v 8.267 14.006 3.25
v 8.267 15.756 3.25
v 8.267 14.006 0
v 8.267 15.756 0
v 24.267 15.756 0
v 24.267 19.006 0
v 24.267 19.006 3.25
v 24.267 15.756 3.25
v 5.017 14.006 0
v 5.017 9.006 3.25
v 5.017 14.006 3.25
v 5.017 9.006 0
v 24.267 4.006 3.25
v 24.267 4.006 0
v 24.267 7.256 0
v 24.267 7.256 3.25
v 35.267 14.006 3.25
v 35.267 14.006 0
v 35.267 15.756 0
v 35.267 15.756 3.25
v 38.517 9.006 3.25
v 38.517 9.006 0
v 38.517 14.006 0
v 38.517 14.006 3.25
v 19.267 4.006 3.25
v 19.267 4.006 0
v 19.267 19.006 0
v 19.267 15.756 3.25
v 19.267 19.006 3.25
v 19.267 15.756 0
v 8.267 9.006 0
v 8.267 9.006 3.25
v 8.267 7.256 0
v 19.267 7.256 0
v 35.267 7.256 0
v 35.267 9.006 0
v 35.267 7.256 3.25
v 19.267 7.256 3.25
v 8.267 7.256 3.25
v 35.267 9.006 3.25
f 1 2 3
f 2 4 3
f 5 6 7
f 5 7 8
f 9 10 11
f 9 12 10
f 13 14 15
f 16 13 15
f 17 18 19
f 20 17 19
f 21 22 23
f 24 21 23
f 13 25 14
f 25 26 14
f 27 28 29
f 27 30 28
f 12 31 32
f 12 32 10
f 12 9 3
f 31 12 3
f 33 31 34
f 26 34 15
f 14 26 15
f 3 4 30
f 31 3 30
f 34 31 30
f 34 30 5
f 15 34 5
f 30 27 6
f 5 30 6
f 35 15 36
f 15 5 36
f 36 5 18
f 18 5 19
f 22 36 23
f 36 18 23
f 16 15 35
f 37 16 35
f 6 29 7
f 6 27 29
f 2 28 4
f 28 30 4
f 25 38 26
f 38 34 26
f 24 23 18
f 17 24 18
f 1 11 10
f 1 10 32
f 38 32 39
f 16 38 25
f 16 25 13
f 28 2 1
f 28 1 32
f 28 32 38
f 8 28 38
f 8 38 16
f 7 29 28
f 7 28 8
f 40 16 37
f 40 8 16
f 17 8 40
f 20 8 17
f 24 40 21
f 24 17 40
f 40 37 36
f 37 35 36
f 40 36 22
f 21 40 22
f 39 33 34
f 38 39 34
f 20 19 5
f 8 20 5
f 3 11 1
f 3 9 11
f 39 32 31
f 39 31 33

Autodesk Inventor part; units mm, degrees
ref_plane "YZ Plane" through (0, 0, 0) normal (1, 0, 0) x (0, 1, 0)
ref_plane "XZ Plane" through (0, 0, 0) normal (0, 1, 0) x (-1, 0, 0)
ref_plane "XY Plane" through (0, 0, 0) normal (0, 0, 1) x (1, 0, 0)
sketch "Block1" plane through (0, 0, 0) normal (0, 0, 1) x (1, 0, 0)
  circle A0 centre (74.029, 24.2723) radius 1
  line L0 (49.279, 30.4723) -> (71.779, 30.4723)
  line L1 (71.779, 30.4723) -> (71.779, 18.0723)
  line L2 (71.779, 18.0723) -> (49.279, 18.0723)
  line L3 (49.279, 18.0723) -> (49.279, 30.4723)
  line L4 (49.279, 30.4723) -> (44.779, 30.4723)
  line L5 (44.779, 30.4723) -> (44.779, 18.0723)
  line L6 (44.779, 18.0723) -> (49.279, 18.0723)
  line L7 (49.279, 18.0723) -> (49.279, 30.4723)
  line L8 (71.779, 30.4723) -> (76.279, 30.4723)
  line L9 (76.279, 30.4723) -> (76.279, 18.0723)
  line L10 (76.279, 18.0723) -> (71.779, 18.0723)
  line L11 (71.779, 18.0723) -> (71.779, 30.4723)
  line L12 (44.779, 24.2723) -> (76.279, 24.2723) construction
  line L13 (47.029, 30.4723) -> (47.029, 18.0723) construction
  circle A1 centre (47.029, 24.2723) radius 1
  line L14 (74.029, 30.4723) -> (74.029, 18.0723) construction
  point P0 (60.979, 24.0984)
  dimension "d7" = 22.5
  dimension "d8" = 12.4
  dimension "d9" = 4.5
  dimension "d10" = 4.5
  dimension "d11" = 2
  dimension "d12" = 2
sketch "Sketch1" plane through (0, 0, 0) normal (0, 0, 1) x (1, 0, 0)
  line L0 (-92.7646, -8.503) -> (-89.7646, -8.503)
  line L1 (-89.7646, -8.503) -> (-89.7646, -11.753)
  line L2 (-89.7646, -11.753) -> (-92.7646, -11.753)
  line L3 (-92.7646, -11.753) -> (-92.7646, -8.503)
  line L4 (-92.7646, -21.6527) -> (-89.7646, -21.6527)
  line L5 (-89.7646, -21.6527) -> (-89.7646, -21.7527)
  line L6 (-89.7646, -21.7527) -> (-92.7646, -21.7527)
  line L7 (-92.7646, -21.7527) -> (-92.7646, -21.6527)
  line L8 (8.2668, 7.2563) -> (35.2668, 7.2563)
  line L9 (35.2668, 7.2563) -> (35.2668, 15.7563)
  line L10 (35.2668, 15.7563) -> (8.2668, 15.7563)
  line L11 (8.2668, 15.7563) -> (8.2668, 7.2563)
  line L12 (8.2668, 11.5063) -> (35.2668, 11.5063) construction
  line L13 (21.7668, 15.7563) -> (21.7668, 7.2563) construction
  line L14 (19.2668, 19.0063) -> (24.2668, 19.0063)
  line L15 (24.2668, 19.0063) -> (24.2668, 15.7563)
  line L16 (24.2668, 15.7563) -> (19.2668, 15.7563)
  line L17 (19.2668, 15.7563) -> (19.2668, 19.0063)
  line L18 (21.7668, 19.0063) -> (21.7668, 15.7563) construction
  line L19 (19.2668, 4.0063) -> (24.2668, 4.0063)
  line L20 (24.2668, 4.0063) -> (24.2668, 7.2563)
  line L21 (24.2668, 7.2563) -> (19.2668, 7.2563)
  line L22 (19.2668, 7.2563) -> (19.2668, 4.0063)
  line L23 (21.7668, 4.0063) -> (21.7668, 7.2563) construction
  line L24 (5.0168, 14.0063) -> (8.2668, 14.0063)
  line L25 (8.2668, 14.0063) -> (8.2668, 9.0063)
  line L26 (8.2668, 9.0063) -> (5.0168, 9.0063)
  line L27 (5.0168, 9.0063) -> (5.0168, 14.0063)
  line L28 (5.0168, 11.5063) -> (8.2668, 11.5063) construction
  line L29 (38.5168, 14.0063) -> (35.2668, 14.0063)
  line L30 (35.2668, 14.0063) -> (35.2668, 9.0063)
  line L31 (35.2668, 9.0063) -> (38.5168, 9.0063)
  line L32 (38.5168, 9.0063) -> (38.5168, 14.0063)
  line L33 (38.5168, 11.5063) -> (35.2668, 11.5063) construction
  point P0 (0, 0)
  point P1 (21.7668, 4.0063)
  dimension "d0" = 3
  dimension "mat" = 3.25
  dimension "d2" = 3
  dimension "d3" = 0.1
  dimension "d58" = 27
  dimension "d59" = 8.5
  dimension "d62" = 5
  dimension "d63" = 3.25
  dimension "d64" = 3.25
  dimension "d65" = 5
extrude "Extrusion5" add sketch "Sketch1" along normal blind 3.25 contours L11 L10 L9 L8
extrude "Extrusion6" cut sketch "Sketch1" along normal blind 3.25 contours L8 L20 L19 L22 | L26 L27 L24 L11 | L9 L29 L32 L31 | L17 L14 L15 L10
extrude "Extrusion7" add sketch "Sketch1" along normal blind 3.25 contours L26 L27 L24 L11 | L9 L29 L32 L31
extrude "Extrusion8" add sketch "Sketch1" along normal blind 3.25 contours L8 L20 L19 L22 | L17 L14 L15 L10
equation "\"d63\" = mat"
equation "\"d64\" = mat"
equation "\"d60\" = mat"
equation "\"d66\" = mat"
equation "\"d68\" = mat"
equation "\"d70\" = mat"
properties part number "arm-servo"
